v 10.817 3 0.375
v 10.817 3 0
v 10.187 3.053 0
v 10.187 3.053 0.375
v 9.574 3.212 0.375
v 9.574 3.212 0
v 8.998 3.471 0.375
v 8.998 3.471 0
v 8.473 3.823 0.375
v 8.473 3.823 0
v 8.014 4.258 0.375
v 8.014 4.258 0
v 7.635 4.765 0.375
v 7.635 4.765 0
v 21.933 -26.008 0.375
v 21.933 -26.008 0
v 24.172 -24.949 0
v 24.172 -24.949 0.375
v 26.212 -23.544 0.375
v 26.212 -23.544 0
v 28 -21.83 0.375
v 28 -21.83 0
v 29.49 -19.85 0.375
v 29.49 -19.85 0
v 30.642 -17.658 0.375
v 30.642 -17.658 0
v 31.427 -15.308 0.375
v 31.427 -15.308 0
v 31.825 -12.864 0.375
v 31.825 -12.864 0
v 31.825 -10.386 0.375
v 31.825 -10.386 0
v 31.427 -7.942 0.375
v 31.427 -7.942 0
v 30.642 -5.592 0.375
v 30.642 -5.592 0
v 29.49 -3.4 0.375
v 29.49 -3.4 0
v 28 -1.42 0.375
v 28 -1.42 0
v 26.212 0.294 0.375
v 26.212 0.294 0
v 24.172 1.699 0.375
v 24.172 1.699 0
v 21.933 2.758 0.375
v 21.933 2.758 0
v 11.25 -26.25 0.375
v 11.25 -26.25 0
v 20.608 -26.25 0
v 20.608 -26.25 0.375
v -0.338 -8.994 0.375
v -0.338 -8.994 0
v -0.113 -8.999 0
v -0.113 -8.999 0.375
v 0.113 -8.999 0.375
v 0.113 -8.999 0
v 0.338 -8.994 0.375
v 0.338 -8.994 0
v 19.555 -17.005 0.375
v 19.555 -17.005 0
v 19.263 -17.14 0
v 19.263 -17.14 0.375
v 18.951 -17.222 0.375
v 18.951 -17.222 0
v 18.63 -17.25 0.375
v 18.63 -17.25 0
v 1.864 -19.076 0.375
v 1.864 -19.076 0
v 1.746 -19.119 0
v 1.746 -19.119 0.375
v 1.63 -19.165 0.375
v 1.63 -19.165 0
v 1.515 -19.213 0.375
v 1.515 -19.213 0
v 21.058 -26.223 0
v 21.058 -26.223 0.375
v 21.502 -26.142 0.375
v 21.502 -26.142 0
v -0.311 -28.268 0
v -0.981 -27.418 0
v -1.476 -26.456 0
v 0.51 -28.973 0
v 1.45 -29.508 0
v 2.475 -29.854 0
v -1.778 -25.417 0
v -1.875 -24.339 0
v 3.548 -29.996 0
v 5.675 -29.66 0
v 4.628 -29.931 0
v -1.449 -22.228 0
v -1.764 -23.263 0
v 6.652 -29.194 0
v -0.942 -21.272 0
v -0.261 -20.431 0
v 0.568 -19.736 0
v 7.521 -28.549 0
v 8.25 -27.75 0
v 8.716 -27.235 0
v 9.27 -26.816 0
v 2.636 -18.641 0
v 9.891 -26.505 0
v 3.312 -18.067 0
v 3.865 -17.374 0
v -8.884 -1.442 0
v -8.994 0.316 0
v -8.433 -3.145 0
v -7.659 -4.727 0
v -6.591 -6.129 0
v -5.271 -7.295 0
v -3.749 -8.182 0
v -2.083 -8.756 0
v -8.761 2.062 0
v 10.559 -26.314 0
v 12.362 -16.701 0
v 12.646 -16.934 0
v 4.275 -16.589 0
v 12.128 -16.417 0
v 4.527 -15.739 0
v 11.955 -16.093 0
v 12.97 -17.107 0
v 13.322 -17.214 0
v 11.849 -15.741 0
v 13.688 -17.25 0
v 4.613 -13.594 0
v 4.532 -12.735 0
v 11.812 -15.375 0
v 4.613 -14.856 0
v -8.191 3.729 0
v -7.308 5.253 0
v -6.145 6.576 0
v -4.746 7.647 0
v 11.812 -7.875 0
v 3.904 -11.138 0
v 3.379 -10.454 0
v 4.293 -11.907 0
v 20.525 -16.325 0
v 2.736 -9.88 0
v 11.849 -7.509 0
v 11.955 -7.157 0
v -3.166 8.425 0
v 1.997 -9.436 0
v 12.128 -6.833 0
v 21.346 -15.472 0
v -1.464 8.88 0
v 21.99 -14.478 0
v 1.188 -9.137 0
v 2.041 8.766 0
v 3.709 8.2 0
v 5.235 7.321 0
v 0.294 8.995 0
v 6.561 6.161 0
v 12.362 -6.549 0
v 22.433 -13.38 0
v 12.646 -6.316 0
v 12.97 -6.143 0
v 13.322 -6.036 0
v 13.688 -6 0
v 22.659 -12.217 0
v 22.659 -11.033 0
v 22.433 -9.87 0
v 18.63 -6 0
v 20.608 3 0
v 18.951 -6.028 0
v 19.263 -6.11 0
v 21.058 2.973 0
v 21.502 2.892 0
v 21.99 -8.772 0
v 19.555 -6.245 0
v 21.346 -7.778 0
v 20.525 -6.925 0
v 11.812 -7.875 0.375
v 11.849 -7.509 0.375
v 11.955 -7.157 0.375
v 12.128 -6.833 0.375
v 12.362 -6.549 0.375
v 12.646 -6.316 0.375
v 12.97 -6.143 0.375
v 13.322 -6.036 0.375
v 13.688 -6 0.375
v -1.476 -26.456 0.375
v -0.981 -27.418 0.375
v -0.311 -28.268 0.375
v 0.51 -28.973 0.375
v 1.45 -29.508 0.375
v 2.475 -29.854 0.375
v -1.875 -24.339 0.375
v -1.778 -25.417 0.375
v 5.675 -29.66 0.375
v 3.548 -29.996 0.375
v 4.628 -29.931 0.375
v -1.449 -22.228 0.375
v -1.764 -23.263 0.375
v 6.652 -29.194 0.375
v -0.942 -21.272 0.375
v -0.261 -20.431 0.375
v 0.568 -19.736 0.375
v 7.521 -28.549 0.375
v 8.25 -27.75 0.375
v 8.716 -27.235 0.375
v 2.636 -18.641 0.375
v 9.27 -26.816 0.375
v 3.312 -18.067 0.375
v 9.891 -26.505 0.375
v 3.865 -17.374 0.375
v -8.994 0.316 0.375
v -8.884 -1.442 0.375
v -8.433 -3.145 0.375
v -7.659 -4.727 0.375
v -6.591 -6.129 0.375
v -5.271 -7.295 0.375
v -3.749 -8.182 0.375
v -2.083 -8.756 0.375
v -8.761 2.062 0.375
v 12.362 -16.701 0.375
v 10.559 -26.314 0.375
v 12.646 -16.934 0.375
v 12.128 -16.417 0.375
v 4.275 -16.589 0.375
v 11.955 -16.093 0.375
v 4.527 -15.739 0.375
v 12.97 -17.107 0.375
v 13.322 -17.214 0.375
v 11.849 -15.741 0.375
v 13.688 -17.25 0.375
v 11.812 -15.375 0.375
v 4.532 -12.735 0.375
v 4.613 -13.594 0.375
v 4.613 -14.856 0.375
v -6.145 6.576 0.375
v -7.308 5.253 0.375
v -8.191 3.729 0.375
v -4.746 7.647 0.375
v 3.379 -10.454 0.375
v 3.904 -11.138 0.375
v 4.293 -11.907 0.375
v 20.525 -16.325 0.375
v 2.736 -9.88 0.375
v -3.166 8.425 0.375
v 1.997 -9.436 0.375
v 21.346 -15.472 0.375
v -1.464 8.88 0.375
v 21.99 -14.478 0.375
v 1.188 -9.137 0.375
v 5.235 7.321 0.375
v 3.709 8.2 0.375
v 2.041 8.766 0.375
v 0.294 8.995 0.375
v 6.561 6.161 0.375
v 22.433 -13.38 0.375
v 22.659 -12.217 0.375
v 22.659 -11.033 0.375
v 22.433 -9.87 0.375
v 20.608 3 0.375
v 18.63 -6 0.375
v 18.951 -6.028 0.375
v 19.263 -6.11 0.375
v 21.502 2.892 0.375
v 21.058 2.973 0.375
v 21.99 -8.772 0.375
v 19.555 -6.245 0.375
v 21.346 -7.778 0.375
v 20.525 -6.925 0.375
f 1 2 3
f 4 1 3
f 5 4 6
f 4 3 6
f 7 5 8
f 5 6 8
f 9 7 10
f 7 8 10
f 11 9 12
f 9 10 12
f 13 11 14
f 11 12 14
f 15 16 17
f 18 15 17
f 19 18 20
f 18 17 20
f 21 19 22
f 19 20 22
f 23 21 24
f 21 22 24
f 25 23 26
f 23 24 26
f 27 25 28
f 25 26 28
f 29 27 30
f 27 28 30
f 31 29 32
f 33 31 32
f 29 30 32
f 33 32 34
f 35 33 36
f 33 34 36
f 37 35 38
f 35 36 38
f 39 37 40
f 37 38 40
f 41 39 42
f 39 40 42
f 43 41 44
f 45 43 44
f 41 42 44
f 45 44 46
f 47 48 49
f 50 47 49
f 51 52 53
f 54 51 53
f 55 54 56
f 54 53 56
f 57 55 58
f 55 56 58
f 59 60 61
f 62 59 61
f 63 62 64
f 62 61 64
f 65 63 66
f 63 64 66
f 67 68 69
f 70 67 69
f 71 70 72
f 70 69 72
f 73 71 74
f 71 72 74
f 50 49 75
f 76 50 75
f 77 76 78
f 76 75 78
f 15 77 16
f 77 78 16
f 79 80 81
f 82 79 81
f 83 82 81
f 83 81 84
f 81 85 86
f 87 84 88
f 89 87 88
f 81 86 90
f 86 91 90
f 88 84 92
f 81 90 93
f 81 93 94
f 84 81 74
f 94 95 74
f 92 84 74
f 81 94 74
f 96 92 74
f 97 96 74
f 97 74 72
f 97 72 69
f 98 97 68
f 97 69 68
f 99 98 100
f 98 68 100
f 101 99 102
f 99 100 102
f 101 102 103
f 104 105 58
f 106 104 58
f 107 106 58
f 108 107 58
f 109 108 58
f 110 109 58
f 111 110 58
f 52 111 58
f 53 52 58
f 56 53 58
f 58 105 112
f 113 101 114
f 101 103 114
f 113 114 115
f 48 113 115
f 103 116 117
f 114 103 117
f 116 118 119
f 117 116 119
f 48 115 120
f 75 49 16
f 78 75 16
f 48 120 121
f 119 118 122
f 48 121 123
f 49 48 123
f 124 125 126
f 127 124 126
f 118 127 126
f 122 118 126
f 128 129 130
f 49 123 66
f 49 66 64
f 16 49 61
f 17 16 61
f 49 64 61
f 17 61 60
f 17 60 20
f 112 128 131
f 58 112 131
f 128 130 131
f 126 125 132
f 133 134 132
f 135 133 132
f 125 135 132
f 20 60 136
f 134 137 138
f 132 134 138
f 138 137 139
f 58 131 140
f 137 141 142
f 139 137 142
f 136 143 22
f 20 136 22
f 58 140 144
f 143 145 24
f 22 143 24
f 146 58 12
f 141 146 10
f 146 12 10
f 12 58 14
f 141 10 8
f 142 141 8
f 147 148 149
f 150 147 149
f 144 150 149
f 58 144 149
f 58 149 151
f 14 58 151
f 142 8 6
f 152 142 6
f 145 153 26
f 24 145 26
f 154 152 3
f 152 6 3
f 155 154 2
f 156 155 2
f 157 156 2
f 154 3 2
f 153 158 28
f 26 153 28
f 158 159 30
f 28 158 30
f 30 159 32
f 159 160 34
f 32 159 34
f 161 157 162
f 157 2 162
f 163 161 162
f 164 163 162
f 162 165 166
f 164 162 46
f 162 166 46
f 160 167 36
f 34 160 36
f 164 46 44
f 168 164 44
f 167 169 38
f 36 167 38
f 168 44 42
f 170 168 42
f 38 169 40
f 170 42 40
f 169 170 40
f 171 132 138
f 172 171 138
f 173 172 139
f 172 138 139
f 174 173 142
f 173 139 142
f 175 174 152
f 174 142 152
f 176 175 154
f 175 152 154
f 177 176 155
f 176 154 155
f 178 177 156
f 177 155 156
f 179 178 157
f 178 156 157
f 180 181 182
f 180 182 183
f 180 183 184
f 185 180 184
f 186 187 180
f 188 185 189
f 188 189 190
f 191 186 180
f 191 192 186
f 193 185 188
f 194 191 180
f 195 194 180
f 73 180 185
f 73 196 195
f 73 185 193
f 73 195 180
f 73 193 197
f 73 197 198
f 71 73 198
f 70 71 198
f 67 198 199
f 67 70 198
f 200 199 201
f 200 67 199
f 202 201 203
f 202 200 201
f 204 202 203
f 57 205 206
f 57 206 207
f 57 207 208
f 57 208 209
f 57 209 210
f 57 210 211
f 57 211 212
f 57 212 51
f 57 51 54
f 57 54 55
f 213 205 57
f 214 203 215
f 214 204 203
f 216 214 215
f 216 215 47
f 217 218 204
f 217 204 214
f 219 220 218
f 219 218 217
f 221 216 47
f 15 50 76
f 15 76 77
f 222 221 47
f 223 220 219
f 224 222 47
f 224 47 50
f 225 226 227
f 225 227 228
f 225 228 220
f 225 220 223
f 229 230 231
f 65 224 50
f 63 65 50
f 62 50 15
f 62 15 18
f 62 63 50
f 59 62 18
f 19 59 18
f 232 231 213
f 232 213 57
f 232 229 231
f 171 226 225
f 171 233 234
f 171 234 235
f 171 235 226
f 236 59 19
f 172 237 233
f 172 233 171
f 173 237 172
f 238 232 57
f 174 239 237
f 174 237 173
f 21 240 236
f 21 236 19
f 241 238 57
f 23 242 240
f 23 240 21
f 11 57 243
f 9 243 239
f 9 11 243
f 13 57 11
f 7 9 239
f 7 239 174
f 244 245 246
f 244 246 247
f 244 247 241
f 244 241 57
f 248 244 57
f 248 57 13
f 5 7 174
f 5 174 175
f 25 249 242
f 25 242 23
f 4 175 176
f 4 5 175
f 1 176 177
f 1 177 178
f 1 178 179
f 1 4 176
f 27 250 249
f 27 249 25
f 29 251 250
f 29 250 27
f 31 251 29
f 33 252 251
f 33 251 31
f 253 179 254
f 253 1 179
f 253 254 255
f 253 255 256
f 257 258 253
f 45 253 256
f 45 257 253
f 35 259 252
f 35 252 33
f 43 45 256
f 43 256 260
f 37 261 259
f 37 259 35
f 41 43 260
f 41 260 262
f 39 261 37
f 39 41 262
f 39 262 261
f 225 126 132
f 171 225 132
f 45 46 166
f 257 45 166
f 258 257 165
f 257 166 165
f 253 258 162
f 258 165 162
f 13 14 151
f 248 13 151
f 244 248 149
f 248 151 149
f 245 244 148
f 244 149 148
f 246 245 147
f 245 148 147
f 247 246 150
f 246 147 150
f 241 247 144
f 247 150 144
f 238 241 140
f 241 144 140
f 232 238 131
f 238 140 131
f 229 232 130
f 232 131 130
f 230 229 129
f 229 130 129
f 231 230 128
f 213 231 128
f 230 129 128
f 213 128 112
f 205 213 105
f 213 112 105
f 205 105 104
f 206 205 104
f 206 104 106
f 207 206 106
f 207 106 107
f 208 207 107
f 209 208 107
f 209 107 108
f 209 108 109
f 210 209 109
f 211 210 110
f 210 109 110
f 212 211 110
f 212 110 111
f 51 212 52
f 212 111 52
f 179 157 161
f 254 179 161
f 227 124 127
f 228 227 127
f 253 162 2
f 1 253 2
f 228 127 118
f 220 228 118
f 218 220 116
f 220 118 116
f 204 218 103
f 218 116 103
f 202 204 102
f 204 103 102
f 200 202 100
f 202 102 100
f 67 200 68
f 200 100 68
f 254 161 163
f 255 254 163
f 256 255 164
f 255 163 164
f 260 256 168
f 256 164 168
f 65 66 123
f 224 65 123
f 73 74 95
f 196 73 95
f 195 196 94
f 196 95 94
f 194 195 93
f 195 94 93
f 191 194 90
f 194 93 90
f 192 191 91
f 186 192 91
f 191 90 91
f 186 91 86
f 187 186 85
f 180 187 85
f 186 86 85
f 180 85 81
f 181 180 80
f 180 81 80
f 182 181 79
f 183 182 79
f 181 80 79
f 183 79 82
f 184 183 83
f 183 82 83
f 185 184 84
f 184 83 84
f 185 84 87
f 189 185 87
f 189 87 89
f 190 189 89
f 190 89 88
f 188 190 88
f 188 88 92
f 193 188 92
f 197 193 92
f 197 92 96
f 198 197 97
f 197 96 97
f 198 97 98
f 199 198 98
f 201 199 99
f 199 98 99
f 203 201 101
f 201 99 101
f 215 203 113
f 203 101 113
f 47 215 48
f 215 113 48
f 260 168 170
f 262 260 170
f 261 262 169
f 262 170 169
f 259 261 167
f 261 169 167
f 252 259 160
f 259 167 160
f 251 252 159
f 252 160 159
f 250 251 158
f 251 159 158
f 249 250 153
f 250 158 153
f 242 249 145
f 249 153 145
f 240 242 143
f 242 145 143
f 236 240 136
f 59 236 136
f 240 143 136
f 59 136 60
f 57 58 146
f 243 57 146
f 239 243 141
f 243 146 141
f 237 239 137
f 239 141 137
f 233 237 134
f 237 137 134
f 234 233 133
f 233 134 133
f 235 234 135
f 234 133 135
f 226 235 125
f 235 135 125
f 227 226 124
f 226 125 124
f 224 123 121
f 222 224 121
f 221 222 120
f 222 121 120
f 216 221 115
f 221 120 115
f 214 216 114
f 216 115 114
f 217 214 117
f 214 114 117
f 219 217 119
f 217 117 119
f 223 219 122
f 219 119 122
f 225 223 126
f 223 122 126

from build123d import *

# Parameters (mm, degrees)
F1_DEPTH = 1
F2_SCALE = 0.5
F3_SCALE = 0.75


# Not quite as in the source:
# - a feature of the source that left no trace in its solid (it failed there, or was rolled back) is left out


with BuildPart() as f1:
    # F0 (on Top) → F1 (new body)
    with BuildSketch(Plane.XY):
        with BuildLine():
            ThreePointArc((28.844410196, 8.0000000124), (23.9936976971, 9.2552536894), (20.3607601383, 12.7058823617))
            ThreePointArc((20.3607601383, 12.7058823617), (-20.765045237, 12.0338230128), (-0.9013340087, -23.9830689655))
            ThreePointArc((-0.9013340087, -23.9830689655), (0, -23.95), (0.9013340087, -23.9830689655))
            ThreePointArc((0.9013340087, -23.9830689655), (9.0104497198, -27.8773184793), (12.3, -36.25))
            Line((12.3, -36.25), (12.3, -39.6172702312))
            ThreePointArc((12.3, -39.6172702312), (10.3056584811, -46.3316877988), (4.9693653218, -50.8687327272))
            ThreePointArc((4.9693653218, -50.8687327272), (4.5085414865, -51.0611792515), (4.0402855379, -51.2347610435))
            ThreePointArc((4.0402855379, -51.2347610435), (-1.7764718202, -74.2905711056), (22, -74))
            ThreePointArc((22, -74), (25.527864045, -71.05572809), (30, -70))
            Line((30, -70), (54.9544511501, -70))
            ThreePointArc((54.9544511501, -70), (56.7505041703, -69.8373875368), (58.4881450694, -69.3548387097))
            ThreePointArc((58.4881450694, -69.3548387097), (85.0000000049, -30.9999999956), (58.488145074, 7.3548387217))
            ThreePointArc((58.488145074, 7.3548387217), (56.7505041744, 7.837387549), (54.9544511536, 8.0000000124))
            Line((54.9544511536, 8.0000000124), (28.844410196, 8.0000000124))
        make_face()
        with BuildLine():
            ThreePointArc((52.1479989309, -16.652173913), (60.5, -31), (52.1479989309, -45.347826087))
            ThreePointArc((52.1479989309, -45.347826087), (50.9557931419, -45.8342078169), (49.6789083458, -46))
            Line((49.6789083458, -46), (36.5, -46))
            ThreePointArc((36.5, -46), (32.9644660941, -44.5355339059), (31.5, -41))
            Line((31.5, -41), (31.5, -21))
            ThreePointArc((31.5, -21), (32.9644660941, -17.4644660941), (36.5, -16))
            Line((36.5, -16), (49.6789083458, -16))
            ThreePointArc((49.6789083458, -16), (50.9557931419, -16.1657921831), (52.1479989309, -16.652173913))
        make_face(mode=Mode.SUBTRACT)
        with BuildLine():
            ThreePointArc((0.9013340087, -23.9830689655), (0, -23.95), (-0.9013340087, -23.9830689655))
            ThreePointArc((-0.9013340087, -23.9830689655), (0, -24), (0.9013340087, -23.9830689655))
        make_face()
        with BuildLine():
            ThreePointArc((4.0402855379, -51.2347610435), (4.5085414865, -51.0611792515), (4.9693653218, -50.8687327272))
            ThreePointArc((4.9693653218, -50.8687327272), (4.501778675, -51.0440133899), (4.0402855379, -51.2347610435))
        make_face()
    extrude(amount=F1_DEPTH)


with BuildPart() as f1_1:
    # F2: moved
    add(f1.part.scale(F2_SCALE))


with BuildPart() as f1_2:
    # F3: moved
    add(f1_1.part.scale(F3_SCALE))


solid = f1_2.part
